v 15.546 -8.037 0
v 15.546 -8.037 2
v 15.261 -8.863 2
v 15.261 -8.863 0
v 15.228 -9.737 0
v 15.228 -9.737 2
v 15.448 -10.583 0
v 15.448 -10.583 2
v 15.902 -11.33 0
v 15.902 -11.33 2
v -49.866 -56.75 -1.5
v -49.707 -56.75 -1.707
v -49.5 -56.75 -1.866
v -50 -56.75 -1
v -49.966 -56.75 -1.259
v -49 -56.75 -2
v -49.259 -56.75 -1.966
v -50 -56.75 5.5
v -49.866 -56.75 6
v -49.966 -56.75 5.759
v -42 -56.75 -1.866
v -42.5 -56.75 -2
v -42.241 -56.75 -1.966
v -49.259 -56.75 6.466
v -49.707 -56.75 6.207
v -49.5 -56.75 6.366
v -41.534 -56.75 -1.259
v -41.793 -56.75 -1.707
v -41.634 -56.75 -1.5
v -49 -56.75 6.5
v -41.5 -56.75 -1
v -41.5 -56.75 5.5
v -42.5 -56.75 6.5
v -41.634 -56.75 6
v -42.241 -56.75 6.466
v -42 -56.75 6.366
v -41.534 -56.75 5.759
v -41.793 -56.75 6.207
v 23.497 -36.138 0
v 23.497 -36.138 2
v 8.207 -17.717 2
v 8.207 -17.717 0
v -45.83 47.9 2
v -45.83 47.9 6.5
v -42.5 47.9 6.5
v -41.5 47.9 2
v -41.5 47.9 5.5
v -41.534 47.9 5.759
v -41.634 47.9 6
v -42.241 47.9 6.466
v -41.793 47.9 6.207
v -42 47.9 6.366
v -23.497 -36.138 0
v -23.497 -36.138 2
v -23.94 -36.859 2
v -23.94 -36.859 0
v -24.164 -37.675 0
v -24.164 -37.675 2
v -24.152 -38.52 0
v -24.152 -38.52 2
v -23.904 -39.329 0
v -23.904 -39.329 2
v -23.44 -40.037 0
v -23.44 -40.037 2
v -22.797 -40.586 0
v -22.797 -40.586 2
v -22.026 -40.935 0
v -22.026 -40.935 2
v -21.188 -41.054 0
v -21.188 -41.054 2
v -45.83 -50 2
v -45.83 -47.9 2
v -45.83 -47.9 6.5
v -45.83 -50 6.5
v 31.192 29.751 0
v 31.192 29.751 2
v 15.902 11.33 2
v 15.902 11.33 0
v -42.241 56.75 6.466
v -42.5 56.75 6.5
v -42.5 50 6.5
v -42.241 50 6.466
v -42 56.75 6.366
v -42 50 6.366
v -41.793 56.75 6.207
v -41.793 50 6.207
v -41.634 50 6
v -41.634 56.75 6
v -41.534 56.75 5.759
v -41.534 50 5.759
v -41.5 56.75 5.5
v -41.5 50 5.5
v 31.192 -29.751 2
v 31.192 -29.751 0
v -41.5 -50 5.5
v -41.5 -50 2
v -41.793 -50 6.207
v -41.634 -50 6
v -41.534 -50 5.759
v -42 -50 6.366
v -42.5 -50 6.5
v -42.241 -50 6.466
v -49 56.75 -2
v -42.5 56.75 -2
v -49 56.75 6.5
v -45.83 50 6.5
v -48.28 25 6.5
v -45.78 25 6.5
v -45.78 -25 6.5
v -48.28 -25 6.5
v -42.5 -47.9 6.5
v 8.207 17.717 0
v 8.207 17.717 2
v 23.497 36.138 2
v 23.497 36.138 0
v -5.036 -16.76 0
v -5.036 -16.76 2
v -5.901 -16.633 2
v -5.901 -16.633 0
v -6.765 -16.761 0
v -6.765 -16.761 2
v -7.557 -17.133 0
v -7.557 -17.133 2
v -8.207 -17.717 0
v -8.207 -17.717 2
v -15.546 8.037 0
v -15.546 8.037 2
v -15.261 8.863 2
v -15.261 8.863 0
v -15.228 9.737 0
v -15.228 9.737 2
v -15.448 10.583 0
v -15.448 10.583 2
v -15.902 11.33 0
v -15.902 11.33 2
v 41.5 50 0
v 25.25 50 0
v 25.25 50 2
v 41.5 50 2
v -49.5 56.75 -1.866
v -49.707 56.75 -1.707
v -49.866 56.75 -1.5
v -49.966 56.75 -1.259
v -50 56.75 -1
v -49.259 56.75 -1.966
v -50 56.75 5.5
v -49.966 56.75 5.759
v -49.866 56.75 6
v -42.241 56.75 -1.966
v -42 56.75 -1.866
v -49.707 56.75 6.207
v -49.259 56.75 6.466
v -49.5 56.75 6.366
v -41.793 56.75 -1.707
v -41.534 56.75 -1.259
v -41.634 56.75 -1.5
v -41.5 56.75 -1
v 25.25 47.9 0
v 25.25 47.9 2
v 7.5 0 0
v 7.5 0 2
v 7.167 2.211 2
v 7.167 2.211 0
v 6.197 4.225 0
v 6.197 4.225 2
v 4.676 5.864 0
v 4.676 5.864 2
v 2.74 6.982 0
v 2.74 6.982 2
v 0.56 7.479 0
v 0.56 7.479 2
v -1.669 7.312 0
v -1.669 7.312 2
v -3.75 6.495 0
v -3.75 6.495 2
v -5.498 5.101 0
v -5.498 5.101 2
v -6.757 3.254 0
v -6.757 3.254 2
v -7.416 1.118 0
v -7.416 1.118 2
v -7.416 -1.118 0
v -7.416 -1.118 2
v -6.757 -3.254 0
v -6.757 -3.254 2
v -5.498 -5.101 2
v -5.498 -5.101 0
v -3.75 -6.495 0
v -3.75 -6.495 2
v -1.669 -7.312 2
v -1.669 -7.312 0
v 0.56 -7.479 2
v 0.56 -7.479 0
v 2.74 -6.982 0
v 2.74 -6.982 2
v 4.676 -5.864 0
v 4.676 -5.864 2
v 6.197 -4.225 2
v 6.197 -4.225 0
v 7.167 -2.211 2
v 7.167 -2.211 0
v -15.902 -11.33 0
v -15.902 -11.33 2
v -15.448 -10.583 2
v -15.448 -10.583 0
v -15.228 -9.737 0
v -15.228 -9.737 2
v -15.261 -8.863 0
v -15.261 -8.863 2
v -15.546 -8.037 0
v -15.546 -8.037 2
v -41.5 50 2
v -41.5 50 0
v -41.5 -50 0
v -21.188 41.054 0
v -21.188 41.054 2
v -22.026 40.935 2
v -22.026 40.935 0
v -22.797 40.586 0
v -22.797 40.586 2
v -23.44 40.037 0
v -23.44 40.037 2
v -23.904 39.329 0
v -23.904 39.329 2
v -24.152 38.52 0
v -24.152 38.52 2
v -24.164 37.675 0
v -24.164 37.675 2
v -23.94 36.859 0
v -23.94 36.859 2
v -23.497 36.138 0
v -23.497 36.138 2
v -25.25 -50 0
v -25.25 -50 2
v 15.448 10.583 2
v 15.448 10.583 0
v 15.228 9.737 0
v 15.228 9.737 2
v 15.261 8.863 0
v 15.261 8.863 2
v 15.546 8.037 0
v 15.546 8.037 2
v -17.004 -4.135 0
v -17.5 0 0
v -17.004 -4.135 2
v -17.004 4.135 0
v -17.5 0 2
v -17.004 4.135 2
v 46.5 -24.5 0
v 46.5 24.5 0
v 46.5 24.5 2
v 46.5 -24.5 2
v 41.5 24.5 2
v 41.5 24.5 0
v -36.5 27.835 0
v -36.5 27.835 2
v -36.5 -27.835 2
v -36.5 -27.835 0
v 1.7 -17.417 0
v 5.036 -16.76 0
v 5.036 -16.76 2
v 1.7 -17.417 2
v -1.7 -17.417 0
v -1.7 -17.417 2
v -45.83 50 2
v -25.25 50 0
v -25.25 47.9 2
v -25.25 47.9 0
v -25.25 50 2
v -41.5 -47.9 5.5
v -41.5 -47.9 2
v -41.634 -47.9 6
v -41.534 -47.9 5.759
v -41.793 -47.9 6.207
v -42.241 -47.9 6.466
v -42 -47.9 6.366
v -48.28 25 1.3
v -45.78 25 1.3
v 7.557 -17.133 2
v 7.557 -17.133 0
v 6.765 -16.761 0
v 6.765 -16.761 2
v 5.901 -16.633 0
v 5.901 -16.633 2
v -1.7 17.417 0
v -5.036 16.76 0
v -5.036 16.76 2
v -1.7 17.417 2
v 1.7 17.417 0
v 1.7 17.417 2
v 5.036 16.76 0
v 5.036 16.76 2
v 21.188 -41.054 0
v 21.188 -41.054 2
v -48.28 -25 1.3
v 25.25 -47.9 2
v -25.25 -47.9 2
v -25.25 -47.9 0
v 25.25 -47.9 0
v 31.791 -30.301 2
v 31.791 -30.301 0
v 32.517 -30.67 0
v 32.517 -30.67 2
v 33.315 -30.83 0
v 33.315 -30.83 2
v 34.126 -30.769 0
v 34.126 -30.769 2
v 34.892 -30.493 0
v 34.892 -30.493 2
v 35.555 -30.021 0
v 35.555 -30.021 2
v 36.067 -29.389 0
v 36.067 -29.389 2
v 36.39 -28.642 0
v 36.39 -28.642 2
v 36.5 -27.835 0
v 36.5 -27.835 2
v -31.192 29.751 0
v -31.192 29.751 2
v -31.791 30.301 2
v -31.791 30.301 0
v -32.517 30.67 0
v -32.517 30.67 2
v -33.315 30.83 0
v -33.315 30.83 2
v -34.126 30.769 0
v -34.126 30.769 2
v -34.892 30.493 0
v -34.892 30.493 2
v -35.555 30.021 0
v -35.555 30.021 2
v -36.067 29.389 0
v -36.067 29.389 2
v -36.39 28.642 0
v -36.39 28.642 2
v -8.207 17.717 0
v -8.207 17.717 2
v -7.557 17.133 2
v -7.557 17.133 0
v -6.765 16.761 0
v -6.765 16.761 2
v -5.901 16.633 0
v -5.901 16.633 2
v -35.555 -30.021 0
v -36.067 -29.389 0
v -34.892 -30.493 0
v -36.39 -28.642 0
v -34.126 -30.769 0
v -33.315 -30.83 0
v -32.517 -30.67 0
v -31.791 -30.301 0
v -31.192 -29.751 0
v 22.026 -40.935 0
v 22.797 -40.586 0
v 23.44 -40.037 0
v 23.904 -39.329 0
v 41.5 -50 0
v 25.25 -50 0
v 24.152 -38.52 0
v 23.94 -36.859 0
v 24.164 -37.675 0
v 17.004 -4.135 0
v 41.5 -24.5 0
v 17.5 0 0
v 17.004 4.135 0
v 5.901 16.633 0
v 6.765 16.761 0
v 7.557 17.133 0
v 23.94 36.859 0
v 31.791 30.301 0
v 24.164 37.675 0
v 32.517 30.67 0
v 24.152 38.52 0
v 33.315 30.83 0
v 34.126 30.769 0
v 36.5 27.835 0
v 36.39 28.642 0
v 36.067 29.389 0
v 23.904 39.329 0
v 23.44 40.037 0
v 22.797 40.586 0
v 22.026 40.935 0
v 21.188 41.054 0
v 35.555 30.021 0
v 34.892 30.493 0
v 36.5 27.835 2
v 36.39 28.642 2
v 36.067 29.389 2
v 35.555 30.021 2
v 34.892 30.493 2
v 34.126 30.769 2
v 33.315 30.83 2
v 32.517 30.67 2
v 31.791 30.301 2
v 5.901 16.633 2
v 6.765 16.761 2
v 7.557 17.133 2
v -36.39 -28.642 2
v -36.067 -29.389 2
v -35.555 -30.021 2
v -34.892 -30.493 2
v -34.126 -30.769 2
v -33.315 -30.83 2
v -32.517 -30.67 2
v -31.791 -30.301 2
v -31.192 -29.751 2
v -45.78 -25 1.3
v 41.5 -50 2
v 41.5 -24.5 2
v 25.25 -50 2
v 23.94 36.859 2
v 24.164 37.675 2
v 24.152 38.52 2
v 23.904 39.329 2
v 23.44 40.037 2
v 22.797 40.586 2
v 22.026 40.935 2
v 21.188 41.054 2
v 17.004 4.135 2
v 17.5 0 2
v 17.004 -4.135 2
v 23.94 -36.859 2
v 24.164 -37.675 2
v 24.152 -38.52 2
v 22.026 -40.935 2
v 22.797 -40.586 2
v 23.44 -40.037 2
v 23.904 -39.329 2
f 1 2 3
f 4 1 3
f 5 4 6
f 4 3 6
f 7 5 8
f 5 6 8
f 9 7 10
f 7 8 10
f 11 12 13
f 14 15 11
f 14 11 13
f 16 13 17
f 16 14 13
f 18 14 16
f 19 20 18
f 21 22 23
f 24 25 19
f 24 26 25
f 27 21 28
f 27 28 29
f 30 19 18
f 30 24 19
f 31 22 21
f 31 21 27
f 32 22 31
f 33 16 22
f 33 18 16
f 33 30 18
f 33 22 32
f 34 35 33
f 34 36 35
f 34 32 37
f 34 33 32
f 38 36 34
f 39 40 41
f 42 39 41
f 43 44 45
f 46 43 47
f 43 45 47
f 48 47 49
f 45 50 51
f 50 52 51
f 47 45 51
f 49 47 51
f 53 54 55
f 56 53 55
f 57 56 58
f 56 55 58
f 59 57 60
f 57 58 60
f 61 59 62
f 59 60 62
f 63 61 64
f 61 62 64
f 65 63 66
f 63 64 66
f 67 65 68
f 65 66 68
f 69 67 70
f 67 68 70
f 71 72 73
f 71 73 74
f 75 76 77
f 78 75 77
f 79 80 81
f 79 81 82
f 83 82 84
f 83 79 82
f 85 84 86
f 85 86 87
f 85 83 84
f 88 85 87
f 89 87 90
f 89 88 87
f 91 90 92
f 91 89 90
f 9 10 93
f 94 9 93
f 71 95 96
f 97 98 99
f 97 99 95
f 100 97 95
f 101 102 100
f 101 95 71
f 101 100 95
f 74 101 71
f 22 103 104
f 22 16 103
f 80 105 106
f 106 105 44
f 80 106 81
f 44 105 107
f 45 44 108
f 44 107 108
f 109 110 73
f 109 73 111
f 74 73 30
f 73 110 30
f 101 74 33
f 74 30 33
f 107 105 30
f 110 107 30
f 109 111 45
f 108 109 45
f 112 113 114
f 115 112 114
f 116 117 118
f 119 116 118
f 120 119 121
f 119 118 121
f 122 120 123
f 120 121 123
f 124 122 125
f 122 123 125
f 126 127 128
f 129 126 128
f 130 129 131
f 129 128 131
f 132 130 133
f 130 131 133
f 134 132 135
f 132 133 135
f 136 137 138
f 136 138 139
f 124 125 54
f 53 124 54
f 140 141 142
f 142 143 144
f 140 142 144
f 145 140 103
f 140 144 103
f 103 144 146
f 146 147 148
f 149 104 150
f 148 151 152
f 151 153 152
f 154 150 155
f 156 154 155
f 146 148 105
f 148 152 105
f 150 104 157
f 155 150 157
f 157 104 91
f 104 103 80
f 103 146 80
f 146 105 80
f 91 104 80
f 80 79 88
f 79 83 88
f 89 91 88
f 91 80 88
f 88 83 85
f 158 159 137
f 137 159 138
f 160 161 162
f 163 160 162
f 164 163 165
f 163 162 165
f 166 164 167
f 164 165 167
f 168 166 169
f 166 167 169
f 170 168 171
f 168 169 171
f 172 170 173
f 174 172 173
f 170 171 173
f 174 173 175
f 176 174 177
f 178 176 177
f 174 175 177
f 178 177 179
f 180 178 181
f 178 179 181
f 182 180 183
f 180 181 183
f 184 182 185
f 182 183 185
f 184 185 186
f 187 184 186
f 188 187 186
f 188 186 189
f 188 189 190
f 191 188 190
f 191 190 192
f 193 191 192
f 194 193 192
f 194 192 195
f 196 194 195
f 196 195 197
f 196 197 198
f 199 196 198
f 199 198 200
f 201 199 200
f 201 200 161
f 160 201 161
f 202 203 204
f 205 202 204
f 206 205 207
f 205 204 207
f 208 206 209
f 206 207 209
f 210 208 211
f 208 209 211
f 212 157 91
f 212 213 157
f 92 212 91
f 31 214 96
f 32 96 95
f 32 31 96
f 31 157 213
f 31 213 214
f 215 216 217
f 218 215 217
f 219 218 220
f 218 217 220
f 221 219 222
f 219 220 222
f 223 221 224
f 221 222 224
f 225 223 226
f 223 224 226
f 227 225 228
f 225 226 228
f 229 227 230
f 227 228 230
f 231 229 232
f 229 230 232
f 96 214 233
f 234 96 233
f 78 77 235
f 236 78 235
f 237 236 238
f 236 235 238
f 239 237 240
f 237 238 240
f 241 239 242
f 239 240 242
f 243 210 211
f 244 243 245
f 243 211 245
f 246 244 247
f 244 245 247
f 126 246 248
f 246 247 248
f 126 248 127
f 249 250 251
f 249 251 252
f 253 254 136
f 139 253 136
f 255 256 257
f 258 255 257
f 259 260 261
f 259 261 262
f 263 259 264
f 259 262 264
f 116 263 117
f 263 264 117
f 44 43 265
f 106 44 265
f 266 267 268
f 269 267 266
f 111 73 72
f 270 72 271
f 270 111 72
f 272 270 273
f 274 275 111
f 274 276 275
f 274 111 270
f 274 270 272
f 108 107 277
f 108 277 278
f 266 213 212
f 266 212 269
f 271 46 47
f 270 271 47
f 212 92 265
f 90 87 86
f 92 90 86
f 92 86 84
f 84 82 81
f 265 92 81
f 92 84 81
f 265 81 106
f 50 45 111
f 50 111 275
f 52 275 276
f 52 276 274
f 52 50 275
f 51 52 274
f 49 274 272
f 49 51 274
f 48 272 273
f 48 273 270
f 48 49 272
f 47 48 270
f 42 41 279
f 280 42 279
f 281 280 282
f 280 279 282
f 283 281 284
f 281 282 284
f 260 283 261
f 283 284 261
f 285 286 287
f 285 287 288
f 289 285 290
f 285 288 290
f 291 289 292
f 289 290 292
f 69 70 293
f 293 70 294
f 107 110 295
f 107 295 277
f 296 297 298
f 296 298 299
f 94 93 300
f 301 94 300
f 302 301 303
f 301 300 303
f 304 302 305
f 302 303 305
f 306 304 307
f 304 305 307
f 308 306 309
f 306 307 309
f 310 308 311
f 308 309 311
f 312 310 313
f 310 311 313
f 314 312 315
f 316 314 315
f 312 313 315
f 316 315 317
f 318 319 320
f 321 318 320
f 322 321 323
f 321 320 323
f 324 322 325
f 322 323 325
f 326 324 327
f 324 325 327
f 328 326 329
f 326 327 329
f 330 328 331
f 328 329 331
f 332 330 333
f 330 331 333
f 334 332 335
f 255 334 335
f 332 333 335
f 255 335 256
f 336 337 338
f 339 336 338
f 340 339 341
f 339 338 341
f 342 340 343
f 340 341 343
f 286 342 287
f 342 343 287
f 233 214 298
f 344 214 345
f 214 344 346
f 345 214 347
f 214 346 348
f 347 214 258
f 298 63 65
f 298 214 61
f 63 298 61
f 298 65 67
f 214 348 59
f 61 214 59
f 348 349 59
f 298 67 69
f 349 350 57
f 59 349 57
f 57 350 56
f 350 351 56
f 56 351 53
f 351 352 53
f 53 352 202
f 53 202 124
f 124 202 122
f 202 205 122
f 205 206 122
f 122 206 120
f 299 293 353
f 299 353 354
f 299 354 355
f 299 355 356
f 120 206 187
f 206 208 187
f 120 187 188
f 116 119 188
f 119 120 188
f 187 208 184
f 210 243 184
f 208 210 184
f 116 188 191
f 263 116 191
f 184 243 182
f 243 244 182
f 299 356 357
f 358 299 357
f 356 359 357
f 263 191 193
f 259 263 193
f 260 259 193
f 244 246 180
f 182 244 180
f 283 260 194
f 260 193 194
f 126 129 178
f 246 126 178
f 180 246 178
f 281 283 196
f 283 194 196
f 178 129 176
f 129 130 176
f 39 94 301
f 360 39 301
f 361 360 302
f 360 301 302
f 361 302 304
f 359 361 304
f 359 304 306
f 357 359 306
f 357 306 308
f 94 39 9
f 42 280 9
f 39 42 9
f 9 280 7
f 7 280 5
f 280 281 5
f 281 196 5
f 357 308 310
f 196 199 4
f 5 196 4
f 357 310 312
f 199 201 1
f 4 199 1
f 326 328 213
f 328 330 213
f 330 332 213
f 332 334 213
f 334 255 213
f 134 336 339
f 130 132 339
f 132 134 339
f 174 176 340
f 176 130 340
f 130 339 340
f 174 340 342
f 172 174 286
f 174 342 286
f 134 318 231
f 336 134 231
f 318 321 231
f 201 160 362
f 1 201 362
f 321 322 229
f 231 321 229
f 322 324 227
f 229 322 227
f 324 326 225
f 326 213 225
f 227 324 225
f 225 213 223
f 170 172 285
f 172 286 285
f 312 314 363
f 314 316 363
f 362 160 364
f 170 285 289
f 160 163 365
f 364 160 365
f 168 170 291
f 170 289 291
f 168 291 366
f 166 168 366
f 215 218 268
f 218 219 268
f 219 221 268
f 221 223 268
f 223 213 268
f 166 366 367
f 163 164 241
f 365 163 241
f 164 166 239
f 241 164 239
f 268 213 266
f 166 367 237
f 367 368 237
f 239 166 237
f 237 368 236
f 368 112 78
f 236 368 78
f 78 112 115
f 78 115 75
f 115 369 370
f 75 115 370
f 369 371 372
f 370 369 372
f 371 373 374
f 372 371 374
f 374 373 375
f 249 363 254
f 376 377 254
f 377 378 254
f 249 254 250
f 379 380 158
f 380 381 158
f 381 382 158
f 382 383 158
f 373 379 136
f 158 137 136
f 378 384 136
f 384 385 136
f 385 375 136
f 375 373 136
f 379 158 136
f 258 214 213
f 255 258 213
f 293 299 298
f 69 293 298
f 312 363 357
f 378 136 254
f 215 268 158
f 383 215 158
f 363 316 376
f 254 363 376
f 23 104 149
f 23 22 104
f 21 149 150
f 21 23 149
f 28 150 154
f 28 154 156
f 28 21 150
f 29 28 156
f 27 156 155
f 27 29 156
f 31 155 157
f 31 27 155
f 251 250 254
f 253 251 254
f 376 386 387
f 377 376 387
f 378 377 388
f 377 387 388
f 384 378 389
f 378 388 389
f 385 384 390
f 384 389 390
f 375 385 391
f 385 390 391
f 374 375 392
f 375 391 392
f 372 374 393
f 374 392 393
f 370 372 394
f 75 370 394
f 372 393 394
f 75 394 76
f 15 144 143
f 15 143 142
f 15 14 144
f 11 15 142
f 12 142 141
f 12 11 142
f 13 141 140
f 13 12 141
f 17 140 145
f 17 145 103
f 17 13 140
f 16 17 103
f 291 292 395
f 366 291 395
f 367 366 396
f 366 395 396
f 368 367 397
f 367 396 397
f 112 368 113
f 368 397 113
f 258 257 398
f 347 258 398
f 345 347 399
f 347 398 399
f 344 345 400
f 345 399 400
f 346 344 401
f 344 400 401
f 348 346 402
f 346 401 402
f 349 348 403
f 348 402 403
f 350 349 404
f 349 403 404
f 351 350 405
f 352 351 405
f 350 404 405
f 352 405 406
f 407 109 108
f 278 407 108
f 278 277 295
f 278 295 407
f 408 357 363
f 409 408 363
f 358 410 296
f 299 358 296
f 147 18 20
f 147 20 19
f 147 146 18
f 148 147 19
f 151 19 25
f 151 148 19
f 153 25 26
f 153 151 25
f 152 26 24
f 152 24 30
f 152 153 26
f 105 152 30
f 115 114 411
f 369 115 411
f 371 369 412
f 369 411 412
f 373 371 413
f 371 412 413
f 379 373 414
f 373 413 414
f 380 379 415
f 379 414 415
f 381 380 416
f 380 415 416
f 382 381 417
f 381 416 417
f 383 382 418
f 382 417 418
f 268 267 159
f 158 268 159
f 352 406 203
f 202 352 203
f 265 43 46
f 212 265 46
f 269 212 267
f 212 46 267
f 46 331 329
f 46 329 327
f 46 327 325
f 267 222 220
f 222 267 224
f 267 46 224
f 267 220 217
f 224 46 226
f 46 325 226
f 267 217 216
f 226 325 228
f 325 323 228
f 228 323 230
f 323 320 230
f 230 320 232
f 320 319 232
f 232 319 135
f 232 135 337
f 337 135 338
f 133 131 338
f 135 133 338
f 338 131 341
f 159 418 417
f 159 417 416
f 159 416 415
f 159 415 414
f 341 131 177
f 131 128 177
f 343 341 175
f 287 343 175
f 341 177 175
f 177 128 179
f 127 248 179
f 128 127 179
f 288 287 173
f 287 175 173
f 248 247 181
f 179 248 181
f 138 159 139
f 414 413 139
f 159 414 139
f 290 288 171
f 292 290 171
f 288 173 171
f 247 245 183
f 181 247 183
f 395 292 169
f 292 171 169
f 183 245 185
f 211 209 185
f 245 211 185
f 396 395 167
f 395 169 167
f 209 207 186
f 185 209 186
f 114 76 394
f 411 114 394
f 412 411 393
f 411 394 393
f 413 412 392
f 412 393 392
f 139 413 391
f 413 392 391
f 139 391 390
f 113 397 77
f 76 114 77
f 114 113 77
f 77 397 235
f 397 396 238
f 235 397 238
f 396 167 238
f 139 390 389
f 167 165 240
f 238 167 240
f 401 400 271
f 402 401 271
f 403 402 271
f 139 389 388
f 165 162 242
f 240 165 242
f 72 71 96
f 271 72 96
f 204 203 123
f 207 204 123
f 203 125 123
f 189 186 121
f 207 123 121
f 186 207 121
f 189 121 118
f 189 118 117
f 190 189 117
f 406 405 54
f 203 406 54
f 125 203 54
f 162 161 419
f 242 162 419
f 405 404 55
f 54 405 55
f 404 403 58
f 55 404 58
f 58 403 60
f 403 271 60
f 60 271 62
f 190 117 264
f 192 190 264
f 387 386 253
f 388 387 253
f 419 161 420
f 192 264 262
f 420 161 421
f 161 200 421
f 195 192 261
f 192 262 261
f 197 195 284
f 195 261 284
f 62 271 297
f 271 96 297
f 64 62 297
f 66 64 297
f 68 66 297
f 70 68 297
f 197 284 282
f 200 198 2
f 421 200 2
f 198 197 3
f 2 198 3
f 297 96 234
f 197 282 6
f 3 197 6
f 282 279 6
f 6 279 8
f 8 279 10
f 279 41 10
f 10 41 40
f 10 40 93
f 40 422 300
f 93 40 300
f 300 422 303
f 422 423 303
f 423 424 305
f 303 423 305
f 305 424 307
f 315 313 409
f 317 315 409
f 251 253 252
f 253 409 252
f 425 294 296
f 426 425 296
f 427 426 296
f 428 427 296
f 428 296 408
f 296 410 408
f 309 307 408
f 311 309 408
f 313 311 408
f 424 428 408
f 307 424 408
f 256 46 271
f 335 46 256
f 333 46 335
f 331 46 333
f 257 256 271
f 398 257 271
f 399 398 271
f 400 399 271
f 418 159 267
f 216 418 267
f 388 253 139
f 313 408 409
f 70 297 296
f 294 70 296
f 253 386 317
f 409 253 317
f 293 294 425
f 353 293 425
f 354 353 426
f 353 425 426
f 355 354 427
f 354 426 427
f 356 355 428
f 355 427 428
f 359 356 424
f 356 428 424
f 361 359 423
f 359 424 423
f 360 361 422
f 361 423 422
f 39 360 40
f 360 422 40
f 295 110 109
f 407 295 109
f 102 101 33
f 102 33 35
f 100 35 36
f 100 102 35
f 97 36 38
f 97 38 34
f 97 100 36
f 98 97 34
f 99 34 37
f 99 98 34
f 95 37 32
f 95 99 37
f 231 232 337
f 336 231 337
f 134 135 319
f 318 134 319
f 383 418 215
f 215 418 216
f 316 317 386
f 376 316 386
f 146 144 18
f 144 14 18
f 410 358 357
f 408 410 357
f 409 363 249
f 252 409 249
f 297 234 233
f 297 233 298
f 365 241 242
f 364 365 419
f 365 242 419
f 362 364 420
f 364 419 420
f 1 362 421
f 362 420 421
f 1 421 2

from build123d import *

# Parameters (mm, degrees)
F0_W      = 100
F0_H      = 100
F1_DEPTH  = 2
F2_R      = 7.5
F2_W      = 50.5
F2_H      = 2.1
F3_DEPTH  = 25
F4_W      = 8.5
F4_H      = 100
F4_W_2    = 3.5
F4_H_2    = 49
F5_DEPTH  = 25
F6_W      = 8.5
F6_H      = 8.5
F7_DEPTH  = 56.75
F8_W      = 2.5
F8_H      = 50
F9_DEPTH  = 5.2
F10_R     = 1
F11_W     = 1
F11_H     = 2.1
F11_W_2   = 3.33
F12_DEPTH = 4.5


# Not quite as in the source:
# - a pattern or mirror of a feature is missing from the dataset's text; its kind, count and spacing are read off the source's solid


with BuildPart() as f1:
    # F0 (on Top) → F1 (new body)
    with BuildSketch(Plane.XY):
        Rectangle(F0_W, F0_H)
    extrude(amount=F1_DEPTH)

    # F2 (on face) → F3 (cut)
    with BuildSketch(Plane.XY.offset(2)):
        with BuildLine():
            ThreePointArc((-21.1883002739, 41.0541145875), (-23.9038135596, 39.3292567737), (-23.4967439726, 36.1381063176))
            Line((-23.4967439726, 36.1381063176), (-8.2072148474, 17.7169868897))
            ThreePointArc((-8.2072148474, 17.7169868897), (-6.7654738079, 16.7609181236), (-5.0355363465, 16.7598739167))
            ThreePointArc((-5.0355363465, 16.7598739167), (0, 17.5), (5.0355363465, 16.7598739167))
            ThreePointArc((5.0355363465, 16.7598739167), (6.7654738079, 16.7609181236), (8.2072148474, 17.7169868897))
            Line((8.2072148474, 17.7169868897), (23.4967439726, 36.1381063176))
            ThreePointArc((23.4967439726, 36.1381063176), (23.9038135596, 39.3292567737), (21.1883002739, 41.0541145875))
            Line((21.1883002739, 41.0541145875), (-21.1883002739, 41.0541145875))
        make_face()
        with BuildLine():
            ThreePointArc((-15.5455239175, -8.0365842327), (-17.5, 0), (-15.5455239175, 8.0365842327))
            ThreePointArc((-15.5455239175, 8.0365842327), (-15.2278910436, 9.7371118179), (-15.9020271762, 11.3302926568))
            Line((-15.9020271762, 11.3302926568), (-31.1915563014, 29.7514120847))
            ThreePointArc((-31.1915563014, 29.7514120847), (-34.5184961718, 30.6572233604), (-36.5, 27.8354038148))
            Line((-36.5, 27.8354038148), (-36.5, -27.8354038148))
            ThreePointArc((-36.5, -27.8354038148), (-34.5184961718, -30.6572233604), (-31.1915563014, -29.7514120847))
            Line((-31.1915563014, -29.7514120847), (-15.9020271762, -11.3302926568))
            ThreePointArc((-15.9020271762, -11.3302926568), (-15.2278910436, -9.7371118179), (-15.5455239175, -8.0365842327))
        make_face()
        Circle(F2_R)
        with BuildLine():
            Line((15.9020271762, -11.3302926568), (31.1915563014, -29.7514120847))
            ThreePointArc((31.1915563014, -29.7514120847), (34.5184961718, -30.6572233604), (36.5, -27.8354038148))
            Line((36.5, -27.8354038148), (36.5, 27.8354038148))
            ThreePointArc((36.5, 27.8354038148), (34.5184961718, 30.6572233604), (31.1915563014, 29.7514120847))
            Line((31.1915563014, 29.7514120847), (15.9020271762, 11.3302926568))
            ThreePointArc((15.9020271762, 11.3302926568), (15.2278910436, 9.7371118179), (15.5455239175, 8.0365842327))
            ThreePointArc((15.5455239175, 8.0365842327), (17.5, 0), (15.5455239175, -8.0365842327))
            ThreePointArc((15.5455239175, -8.0365842327), (15.2278910436, -9.7371118179), (15.9020271762, -11.3302926568))
        make_face()
        with BuildLine():
            ThreePointArc((21.1883002739, -41.0541145875), (23.9038135596, -39.3292567737), (23.4967439726, -36.1381063176))
            Line((23.4967439726, -36.1381063176), (8.2072148474, -17.7169868897))
            ThreePointArc((8.2072148474, -17.7169868897), (6.7654738079, -16.7609181236), (5.0355363465, -16.7598739167))
            ThreePointArc((5.0355363465, -16.7598739167), (0, -17.5), (-5.0355363465, -16.7598739167))
            ThreePointArc((-5.0355363465, -16.7598739167), (-6.7654738079, -16.7609181236), (-8.2072148474, -17.7169868897))
            Line((-8.2072148474, -17.7169868897), (-23.4967439726, -36.1381063176))
            ThreePointArc((-23.4967439726, -36.1381063176), (-23.9038135596, -39.3292567737), (-21.1883002739, -41.0541145875))
            Line((-21.1883002739, -41.0541145875), (21.1883002739, -41.0541145875))
        make_face()
        with Locations((0, 48.95)):
            Rectangle(F2_W, F2_H)
        with Locations((0, -48.95)):
            Rectangle(F2_W, F2_H)
    extrude(amount=-F3_DEPTH, mode=Mode.SUBTRACT)

    # F4 (on face) → F5 (cut)
    with BuildSketch(Plane(origin=(0, 0, 0), x_dir=(1, 0, 0), z_dir=(0, 0, -1))):
        with Locations((-45.75, 0)):
            Rectangle(F4_W, F4_H)
        Polygon((50, 50), (41.5, 50), (41.5, 24.5), (46.5, 24.5), (50, 24.5), align=None)
        with Locations((48.25, 0)):
            Rectangle(F4_W_2, F4_H_2)
        Polygon((41.5, -24.5), (41.5, -50), (50, -50), (50, -24.5), (46.5, -24.5), align=None)
    extrude(amount=-F5_DEPTH, mode=Mode.SUBTRACT)

    # F6 (on Front) → F7 (join, symmetric)
    with BuildSketch(Plane.XZ):
        with Locations((-45.75, 2.25)):
            Rectangle(F6_W, F6_H)
    extrude(amount=F7_DEPTH, both=True)

    # F8 (on face) → F9 (cut)
    with BuildSketch(Plane.XY.offset(6.5)):
        with Locations((-47.03, 0)):
            Rectangle(F8_W, F8_H)
    extrude(amount=-F9_DEPTH, mode=Mode.SUBTRACT)

    # F10
    f10_edges = [f1.edges().sort_by_distance(p)[0] for p in [
        (-41.5, 0, -2),
        (-41.5, 0, 6.5),
        (-50, 0, -2),
        (-50, 0, 6.5),
    ]]
    fillet(f10_edges, radius=F10_R)

    # F11 (on face) → F12 (cut, through all)
    with BuildSketch(Plane.XY.offset(6.5)):
        with Locations((-42, 48.95)):
            Rectangle(F11_W, F11_H)
        with Locations((-44.165, 48.95)):
            Rectangle(F11_W_2, F11_H)
    f12 = extrude(amount=-F12_DEPTH, mode=Mode.SUBTRACT)

    # F12_copies: F12 across plane
    add(f12.mirror(Plane(origin=(0, 0, 0), x_dir=(0, 0, -1), z_dir=(0, -1, 0))), mode=Mode.SUBTRACT)


solid = f1.part
